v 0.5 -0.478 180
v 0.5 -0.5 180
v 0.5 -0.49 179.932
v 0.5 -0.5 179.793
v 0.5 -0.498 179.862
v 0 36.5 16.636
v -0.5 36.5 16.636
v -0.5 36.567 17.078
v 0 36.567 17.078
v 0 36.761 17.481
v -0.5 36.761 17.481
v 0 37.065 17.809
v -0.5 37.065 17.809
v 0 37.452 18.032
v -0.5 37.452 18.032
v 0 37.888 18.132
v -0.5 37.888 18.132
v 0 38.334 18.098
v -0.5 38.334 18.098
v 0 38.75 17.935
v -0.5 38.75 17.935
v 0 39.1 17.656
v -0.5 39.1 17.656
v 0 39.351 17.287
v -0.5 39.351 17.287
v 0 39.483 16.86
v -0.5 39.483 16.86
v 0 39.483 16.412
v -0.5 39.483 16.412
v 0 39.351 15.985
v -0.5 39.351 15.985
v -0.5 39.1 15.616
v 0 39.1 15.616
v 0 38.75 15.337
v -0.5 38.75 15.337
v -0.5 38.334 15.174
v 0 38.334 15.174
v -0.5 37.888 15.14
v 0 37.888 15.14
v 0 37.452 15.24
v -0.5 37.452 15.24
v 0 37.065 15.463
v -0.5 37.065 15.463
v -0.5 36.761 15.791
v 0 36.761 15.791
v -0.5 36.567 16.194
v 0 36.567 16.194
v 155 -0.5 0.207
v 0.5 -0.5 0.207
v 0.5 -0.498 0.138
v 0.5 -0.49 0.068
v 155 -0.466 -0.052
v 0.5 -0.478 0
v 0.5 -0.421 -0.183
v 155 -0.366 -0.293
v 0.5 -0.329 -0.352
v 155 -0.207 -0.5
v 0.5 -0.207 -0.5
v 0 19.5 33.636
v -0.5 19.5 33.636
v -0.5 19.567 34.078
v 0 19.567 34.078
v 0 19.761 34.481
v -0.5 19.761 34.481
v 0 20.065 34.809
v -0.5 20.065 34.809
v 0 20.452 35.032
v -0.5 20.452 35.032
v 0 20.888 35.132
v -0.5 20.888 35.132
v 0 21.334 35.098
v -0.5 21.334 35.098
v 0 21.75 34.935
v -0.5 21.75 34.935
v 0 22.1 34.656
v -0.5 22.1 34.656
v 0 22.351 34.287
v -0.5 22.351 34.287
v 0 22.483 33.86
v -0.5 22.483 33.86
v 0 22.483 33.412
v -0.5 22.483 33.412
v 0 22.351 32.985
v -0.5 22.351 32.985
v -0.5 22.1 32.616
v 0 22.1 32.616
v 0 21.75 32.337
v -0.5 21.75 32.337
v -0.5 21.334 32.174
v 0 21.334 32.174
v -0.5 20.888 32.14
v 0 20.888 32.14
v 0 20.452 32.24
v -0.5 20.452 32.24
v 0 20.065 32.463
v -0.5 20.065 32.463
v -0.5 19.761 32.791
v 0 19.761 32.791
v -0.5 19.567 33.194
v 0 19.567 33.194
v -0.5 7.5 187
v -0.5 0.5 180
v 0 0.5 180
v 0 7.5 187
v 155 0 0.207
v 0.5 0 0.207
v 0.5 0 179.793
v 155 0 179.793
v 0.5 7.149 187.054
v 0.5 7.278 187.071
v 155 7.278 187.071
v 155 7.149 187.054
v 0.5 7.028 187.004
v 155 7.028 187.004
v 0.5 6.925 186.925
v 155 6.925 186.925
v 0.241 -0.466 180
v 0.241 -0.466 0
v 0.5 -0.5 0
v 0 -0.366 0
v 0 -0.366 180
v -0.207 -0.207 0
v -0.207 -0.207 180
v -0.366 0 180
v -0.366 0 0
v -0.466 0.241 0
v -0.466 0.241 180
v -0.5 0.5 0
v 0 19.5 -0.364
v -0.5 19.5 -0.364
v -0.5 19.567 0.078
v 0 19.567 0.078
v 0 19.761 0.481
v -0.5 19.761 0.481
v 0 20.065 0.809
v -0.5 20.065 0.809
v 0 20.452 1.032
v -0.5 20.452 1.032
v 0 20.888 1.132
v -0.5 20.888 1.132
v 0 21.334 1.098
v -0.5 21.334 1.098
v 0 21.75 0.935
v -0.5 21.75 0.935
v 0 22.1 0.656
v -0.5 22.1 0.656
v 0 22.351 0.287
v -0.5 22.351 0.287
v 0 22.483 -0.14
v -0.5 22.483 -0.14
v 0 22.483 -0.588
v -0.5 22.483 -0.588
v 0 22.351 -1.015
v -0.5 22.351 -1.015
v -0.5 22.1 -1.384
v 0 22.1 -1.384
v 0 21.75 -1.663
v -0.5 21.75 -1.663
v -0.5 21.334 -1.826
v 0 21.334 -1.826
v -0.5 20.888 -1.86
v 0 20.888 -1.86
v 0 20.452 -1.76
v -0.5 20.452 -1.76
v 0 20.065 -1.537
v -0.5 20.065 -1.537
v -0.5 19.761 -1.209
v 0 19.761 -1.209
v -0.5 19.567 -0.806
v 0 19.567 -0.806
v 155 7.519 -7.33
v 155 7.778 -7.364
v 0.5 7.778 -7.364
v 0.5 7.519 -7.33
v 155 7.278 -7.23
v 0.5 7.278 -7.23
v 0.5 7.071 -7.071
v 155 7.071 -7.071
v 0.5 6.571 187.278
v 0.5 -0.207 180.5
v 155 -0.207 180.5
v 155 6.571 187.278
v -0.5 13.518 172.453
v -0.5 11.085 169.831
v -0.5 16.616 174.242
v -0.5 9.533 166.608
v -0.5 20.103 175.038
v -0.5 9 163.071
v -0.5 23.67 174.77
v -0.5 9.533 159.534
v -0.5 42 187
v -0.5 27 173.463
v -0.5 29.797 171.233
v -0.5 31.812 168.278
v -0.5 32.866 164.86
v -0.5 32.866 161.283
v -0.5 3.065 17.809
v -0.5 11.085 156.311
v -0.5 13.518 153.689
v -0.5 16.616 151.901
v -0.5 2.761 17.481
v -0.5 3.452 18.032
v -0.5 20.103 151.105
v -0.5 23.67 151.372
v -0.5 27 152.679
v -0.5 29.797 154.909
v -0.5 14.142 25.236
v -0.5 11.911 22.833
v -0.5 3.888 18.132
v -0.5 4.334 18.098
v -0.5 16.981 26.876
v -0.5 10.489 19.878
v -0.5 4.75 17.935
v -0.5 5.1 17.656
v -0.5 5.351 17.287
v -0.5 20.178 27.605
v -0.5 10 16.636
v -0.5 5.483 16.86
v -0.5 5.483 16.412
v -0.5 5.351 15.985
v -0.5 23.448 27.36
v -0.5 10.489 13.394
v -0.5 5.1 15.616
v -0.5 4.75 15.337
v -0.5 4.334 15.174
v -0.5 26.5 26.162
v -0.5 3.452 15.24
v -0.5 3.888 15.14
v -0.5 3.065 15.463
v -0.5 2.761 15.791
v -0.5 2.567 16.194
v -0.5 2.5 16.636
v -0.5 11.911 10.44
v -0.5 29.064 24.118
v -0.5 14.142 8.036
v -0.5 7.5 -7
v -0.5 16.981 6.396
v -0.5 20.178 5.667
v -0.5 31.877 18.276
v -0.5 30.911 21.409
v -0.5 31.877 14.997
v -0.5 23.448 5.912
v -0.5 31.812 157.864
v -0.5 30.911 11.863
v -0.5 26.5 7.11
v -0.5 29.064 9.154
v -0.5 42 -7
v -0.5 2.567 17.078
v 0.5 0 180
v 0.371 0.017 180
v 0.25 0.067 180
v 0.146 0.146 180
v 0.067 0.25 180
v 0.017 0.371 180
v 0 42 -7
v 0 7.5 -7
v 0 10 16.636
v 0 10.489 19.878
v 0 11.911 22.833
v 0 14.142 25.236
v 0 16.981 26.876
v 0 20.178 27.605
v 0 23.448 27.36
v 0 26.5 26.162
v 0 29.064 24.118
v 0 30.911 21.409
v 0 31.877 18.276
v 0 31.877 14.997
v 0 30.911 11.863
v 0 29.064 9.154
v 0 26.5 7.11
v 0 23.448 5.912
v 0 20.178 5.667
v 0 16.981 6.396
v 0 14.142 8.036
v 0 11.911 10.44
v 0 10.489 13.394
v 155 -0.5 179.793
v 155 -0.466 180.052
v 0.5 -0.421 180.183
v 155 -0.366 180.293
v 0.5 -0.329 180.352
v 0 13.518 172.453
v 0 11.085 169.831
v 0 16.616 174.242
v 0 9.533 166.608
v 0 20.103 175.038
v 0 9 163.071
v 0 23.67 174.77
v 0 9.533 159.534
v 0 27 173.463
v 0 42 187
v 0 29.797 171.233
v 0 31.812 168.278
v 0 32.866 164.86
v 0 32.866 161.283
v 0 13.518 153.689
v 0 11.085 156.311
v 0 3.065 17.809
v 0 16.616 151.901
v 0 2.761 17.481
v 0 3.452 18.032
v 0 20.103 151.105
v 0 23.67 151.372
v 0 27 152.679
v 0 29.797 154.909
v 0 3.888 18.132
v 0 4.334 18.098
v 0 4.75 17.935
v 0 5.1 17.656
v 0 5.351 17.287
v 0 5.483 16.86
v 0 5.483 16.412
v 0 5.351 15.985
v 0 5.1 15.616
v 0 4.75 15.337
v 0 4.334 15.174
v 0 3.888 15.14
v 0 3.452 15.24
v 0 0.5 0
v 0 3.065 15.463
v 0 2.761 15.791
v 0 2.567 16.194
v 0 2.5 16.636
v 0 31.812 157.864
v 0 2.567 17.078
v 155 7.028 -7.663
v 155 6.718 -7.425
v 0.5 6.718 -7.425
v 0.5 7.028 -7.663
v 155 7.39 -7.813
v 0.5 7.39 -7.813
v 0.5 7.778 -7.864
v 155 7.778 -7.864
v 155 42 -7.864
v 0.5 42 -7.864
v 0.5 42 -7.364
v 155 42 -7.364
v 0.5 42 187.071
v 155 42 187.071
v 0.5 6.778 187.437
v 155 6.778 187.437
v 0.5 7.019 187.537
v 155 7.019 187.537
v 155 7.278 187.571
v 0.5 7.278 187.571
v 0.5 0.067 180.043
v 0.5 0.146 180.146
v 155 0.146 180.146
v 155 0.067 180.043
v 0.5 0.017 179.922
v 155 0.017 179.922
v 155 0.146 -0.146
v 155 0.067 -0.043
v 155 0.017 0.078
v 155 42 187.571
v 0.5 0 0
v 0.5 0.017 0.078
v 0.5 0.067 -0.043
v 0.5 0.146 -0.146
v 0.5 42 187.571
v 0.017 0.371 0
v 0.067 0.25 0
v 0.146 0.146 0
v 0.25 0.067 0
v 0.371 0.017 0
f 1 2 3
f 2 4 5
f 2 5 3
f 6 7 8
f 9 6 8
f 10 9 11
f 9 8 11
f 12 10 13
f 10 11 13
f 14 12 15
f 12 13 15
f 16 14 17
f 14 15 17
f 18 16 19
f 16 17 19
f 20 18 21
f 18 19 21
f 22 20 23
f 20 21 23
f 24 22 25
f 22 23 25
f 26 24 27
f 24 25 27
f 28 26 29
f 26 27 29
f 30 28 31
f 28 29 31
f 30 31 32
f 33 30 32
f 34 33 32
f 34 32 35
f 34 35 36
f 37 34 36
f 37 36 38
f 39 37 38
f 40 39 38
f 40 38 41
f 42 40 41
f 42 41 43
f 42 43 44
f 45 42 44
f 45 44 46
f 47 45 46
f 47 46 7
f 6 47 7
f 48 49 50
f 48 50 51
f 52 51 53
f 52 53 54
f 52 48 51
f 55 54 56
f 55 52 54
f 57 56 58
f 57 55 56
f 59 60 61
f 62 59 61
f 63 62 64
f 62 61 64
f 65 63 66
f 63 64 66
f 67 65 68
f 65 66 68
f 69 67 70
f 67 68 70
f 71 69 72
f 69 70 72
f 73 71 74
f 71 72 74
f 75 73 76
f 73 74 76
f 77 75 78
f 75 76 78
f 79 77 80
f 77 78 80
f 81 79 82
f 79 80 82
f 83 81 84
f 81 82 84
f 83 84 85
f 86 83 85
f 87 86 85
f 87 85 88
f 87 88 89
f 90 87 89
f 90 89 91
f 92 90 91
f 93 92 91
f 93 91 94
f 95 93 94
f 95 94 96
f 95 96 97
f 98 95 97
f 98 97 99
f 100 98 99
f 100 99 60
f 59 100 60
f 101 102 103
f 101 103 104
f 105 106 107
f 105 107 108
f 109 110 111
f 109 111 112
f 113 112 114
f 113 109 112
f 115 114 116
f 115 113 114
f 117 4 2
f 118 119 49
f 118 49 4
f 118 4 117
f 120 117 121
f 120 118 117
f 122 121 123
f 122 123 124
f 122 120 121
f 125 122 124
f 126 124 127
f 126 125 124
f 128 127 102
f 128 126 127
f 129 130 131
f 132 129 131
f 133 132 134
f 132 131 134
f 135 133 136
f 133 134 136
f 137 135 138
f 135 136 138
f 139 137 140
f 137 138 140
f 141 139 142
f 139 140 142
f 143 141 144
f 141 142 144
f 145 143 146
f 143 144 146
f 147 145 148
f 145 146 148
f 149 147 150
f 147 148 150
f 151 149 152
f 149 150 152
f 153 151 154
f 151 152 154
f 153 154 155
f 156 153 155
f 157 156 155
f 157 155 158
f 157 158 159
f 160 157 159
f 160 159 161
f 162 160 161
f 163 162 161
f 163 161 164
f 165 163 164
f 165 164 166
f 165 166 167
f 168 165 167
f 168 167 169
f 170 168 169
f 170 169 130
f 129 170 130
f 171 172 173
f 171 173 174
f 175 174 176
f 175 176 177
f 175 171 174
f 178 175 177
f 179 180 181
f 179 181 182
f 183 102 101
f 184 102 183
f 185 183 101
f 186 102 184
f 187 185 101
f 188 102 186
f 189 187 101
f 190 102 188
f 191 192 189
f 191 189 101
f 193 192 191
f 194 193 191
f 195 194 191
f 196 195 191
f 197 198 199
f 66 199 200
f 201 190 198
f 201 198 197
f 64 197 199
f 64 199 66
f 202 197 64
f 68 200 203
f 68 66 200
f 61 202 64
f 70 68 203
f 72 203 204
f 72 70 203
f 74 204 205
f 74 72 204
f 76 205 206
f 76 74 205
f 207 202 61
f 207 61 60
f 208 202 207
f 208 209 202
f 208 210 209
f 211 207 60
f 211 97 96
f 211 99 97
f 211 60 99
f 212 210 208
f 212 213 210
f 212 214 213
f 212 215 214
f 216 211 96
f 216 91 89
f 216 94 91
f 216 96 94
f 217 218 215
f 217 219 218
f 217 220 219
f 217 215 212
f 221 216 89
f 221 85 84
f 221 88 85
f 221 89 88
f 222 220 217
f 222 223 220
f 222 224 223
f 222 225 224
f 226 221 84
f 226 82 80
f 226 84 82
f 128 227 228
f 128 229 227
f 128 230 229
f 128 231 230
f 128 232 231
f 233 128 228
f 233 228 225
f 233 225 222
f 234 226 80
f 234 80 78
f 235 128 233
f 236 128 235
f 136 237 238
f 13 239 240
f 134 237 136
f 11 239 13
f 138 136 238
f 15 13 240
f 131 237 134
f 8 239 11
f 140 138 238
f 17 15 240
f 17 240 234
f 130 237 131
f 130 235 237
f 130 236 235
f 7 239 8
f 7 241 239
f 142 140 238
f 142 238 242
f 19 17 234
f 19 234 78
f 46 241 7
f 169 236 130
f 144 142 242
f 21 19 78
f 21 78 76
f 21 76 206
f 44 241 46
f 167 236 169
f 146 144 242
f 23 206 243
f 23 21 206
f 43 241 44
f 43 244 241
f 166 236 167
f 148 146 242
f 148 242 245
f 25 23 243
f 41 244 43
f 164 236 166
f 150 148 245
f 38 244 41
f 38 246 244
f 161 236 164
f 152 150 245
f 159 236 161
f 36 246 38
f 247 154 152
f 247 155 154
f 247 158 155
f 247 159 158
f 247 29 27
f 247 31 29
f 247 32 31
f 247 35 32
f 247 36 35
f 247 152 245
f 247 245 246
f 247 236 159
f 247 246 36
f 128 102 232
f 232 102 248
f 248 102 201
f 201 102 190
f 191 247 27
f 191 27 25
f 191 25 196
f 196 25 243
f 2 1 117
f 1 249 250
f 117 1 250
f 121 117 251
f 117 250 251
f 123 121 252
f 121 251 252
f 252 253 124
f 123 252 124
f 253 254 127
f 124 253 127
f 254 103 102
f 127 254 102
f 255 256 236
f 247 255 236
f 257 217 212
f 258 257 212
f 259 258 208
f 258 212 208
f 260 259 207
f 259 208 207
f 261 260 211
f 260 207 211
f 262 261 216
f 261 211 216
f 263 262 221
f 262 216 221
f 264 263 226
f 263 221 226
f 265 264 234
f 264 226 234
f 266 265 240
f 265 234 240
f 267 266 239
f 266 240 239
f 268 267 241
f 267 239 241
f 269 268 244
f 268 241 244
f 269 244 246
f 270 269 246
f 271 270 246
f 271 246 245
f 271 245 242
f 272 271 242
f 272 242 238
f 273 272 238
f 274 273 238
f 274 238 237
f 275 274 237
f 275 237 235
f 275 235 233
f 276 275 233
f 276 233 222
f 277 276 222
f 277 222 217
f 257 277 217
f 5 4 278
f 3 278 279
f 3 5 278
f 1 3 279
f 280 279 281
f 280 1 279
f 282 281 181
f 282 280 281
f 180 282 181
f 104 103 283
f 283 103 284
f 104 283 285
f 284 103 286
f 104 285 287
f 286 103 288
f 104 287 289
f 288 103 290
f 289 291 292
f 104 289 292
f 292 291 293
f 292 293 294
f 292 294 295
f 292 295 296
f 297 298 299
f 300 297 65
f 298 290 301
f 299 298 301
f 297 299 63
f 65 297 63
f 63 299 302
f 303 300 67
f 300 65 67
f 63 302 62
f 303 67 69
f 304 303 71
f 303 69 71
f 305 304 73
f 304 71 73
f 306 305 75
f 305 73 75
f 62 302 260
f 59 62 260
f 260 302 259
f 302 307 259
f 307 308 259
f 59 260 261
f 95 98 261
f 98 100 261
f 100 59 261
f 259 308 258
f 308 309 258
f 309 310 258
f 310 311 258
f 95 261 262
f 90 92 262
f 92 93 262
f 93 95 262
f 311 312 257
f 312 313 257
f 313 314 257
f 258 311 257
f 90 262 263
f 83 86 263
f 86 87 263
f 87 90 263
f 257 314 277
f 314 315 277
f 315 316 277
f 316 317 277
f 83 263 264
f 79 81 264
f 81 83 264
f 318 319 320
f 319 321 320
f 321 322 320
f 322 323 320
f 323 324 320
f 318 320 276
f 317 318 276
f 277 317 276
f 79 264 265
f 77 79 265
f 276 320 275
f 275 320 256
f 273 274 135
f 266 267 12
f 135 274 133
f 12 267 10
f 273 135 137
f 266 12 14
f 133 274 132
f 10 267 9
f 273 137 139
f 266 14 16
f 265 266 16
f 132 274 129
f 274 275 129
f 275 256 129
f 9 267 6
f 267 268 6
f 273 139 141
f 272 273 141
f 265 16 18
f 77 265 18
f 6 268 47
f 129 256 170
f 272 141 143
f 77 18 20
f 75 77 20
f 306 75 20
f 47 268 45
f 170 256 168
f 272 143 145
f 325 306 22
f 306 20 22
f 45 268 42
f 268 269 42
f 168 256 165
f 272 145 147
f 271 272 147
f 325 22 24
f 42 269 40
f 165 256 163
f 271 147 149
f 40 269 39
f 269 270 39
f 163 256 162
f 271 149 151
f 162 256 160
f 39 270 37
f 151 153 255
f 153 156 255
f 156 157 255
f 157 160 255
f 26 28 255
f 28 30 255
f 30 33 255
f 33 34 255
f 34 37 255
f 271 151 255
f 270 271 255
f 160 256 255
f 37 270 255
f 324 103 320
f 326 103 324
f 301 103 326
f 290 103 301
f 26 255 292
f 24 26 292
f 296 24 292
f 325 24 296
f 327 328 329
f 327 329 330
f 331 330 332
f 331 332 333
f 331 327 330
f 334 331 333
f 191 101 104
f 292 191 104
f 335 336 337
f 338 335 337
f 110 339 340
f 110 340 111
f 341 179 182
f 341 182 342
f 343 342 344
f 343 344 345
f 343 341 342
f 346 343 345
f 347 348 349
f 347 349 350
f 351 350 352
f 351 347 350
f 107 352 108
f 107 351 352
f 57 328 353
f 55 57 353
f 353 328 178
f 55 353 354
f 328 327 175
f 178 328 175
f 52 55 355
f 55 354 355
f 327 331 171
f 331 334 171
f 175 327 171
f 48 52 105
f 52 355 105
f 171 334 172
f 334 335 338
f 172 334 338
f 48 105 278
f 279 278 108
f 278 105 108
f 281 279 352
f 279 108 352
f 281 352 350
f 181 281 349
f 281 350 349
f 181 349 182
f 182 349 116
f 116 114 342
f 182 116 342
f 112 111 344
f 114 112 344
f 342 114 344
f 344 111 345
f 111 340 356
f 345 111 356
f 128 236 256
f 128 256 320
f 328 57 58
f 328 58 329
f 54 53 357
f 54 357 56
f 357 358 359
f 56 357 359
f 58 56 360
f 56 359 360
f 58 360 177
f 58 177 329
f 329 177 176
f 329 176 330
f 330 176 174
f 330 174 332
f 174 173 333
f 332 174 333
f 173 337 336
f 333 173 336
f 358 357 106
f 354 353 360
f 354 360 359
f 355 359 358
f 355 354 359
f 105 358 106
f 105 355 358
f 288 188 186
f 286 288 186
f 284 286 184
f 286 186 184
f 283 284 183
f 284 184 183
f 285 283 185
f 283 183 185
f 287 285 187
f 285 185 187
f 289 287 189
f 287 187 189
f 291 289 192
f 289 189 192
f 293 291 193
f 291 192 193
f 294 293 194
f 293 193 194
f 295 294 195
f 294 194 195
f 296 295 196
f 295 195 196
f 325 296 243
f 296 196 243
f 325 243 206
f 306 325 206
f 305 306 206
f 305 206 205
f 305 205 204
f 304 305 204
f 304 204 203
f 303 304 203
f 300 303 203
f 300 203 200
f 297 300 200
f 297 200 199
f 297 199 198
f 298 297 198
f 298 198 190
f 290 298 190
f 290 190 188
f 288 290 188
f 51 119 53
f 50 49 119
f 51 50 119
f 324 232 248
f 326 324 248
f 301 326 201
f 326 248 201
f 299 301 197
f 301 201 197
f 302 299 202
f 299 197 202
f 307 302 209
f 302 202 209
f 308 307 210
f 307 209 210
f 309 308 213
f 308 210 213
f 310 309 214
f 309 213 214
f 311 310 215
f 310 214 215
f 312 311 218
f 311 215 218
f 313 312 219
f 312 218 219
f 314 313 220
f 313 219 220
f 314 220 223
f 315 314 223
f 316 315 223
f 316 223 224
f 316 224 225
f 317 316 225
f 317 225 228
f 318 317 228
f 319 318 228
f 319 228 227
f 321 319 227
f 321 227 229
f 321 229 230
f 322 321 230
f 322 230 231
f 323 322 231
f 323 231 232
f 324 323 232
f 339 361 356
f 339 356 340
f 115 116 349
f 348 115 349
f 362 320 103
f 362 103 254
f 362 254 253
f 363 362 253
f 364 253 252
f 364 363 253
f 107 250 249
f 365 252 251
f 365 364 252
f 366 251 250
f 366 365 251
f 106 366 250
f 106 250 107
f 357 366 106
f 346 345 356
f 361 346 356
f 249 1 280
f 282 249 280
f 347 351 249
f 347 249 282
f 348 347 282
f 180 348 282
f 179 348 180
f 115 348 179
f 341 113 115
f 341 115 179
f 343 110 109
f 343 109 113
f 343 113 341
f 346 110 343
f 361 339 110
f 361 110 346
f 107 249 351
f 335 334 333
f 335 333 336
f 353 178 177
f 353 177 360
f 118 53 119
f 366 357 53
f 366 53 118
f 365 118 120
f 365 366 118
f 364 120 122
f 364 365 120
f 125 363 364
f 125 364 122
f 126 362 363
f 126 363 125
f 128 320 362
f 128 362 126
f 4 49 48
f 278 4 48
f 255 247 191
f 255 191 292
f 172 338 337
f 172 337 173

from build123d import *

# Parameters (mm, degrees)
SKETCH1_W                    = 155
SKETCH1_H                    = 180
BASE_FLANGE1_DEPTH           = 0.5
EDGE_FLANGE1_STRIP_W         = 3
EDGE_FLANGE1_STRIP_H         = 0.5
EDGE_FLANGE1_STRIP_CUT_DEPTH = 180
EDGE_FLANGE1_DEPTH           = 180
EDGE_FLANGE3_STRIP_CUT_DEPTH = 154.5
EDGE_FLANGE3_DEPTH           = 154.5
EDGE_FLANGE4_DEPTH           = 154.5
SKETCH25_W                   = 0.5
SKETCH25_H                   = 41.5
BOSS_EXTRUDE1_DEPTH          = 7
CUT_EXTRUDE2_DEPTH           = 0.5
EDGE_FLANGE5_STRIP_CUT_DEPTH = 154.5
EDGE_FLANGE5_DEPTH           = 154.5
EDGE_FLANGE6_STRIP_CUT_DEPTH = 154.5
EDGE_FLANGE6_DEPTH           = 154.5
SKETCH41_W                   = 0.5
SKETCH41_H                   = 41.5
BOSS_EXTRUDE2_DEPTH          = 7
CUT_EXTRUDE3_DEPTH           = 0.5
SKETCH45_R                   = 11
SKETCH45_R_2                 = 12
CUT_EXTRUDE6_DEPTH           = 2
SKETCH51_R                   = 1.5
CUT_EXTRUDE7_DEPTH           = 2


# Sheet-metal steps are written as plain solids
with BuildPart() as part:
    # Sketch1 → Base-Flange1 (new body)
    with BuildSketch(Plane(origin=(0, 0, 0), x_dir=(1, 0, 0), z_dir=(0, 1, 0))):
        with Locations((77.5, -90)):
            Rectangle(SKETCH1_W, SKETCH1_H)
    extrude(amount=-BASE_FLANGE1_DEPTH)

    # Edge-Flange1 strip (across the edge) → Edge-Flange1 strip cut (cut)
    with BuildSketch(Plane.XY):
        with Locations((-1, -0.25)):
            Rectangle(EDGE_FLANGE1_STRIP_W, EDGE_FLANGE1_STRIP_H)
    extrude(amount=EDGE_FLANGE1_STRIP_CUT_DEPTH, mode=Mode.SUBTRACT)

    # Edge-Flange1 section (across the edge) → Edge-Flange1 (add)
    with BuildSketch(Plane.XY):
        with BuildLine():
            Line((-0.5, 0.5), (-0.5, 42))
            Line((-0.5, 42), (0, 42))
            Line((0, 42), (0, 0.5))
            ThreePointArc((0, 0.5), (0.146446609, 0.146446609), (0.5, 0))
            Line((0.5, 0), (0.5, -0.5))
            ThreePointArc((0.5, -0.5), (-0.207106781, -0.207106781), (-0.5, 0.5))
        make_face()
    extrude(amount=EDGE_FLANGE1_DEPTH)

    # Edge-Flange3 strip (across the edge) → Edge-Flange3 strip cut (cut)
    with BuildSketch(Plane(origin=(155, 0, 0), x_dir=(0, 0.7071067811865512, 0.7071067811865438), z_dir=(-1, 0, 0))):
        Polygon((-2.328427125, 1.621320344), (-0.207106781, -0.5), (0.146446609, -0.146446609), (-1.974873734, 1.974873734), align=None)
    extrude(amount=EDGE_FLANGE3_STRIP_CUT_DEPTH, mode=Mode.SUBTRACT)

    # Edge-Flange3 section (across the edge) → Edge-Flange3 (add)
    with BuildSketch(Plane(origin=(155, 0, 0), x_dir=(0, 0.7071067811865512, 0.7071067811865438), z_dir=(-1, 0, 0))):
        with BuildLine():
            Line((-0.5, 0.207106781), (-0.5, 10))
            Line((-0.5, 10), (0, 10))
            Line((0, 10), (0, 0.207106781))
            ThreePointArc((0, 0.207106781), (0.038060234, 0.015765065), (0.146446609, -0.146446609))
            Line((0.146446609, -0.146446609), (-0.207106781, -0.5))
            ThreePointArc((-0.207106781, -0.5), (-0.423879533, -0.175576651), (-0.5, 0.207106781))
        make_face()
    extrude(amount=EDGE_FLANGE3_DEPTH)

    # Edge-Flange4 section (across the edge) → Edge-Flange4 (add)
    with BuildSketch(Plane(origin=(155, 7.363961031, -7.363961031), x_dir=(0, 0, 1), z_dir=(-1, 0, 0))):
        with BuildLine():
            Line((-0.5, 0.414213562), (-0.5, 34.636038969))
            Line((-0.5, 34.636038969), (0, 34.636038969))
            Line((0, 34.636038969), (0, 0.414213562))
            ThreePointArc((0, 0.414213562), (0.076120467, 0.03153013), (0.292893219, -0.292893219))
            Line((0.292893219, -0.292893219), (-0.060660172, -0.646446609))
            ThreePointArc((-0.060660172, -0.646446609), (-0.385819299, -0.159811586), (-0.5, 0.414213562))
        make_face()
    extrude(amount=EDGE_FLANGE4_DEPTH)

    # Sketch25 → Boss-Extrude1 (add)
    with BuildSketch(Plane(origin=(0, 0, 0), x_dir=(-1, 0, 0), z_dir=(0, 0, -1))):
        with Locations((0.25, 21.25)):
            Rectangle(SKETCH25_W, SKETCH25_H)
    extrude(amount=BOSS_EXTRUDE1_DEPTH)

    # Sketch28 → Cut-Extrude2 (cut)
    with BuildSketch(Plane.ZY.offset(0.5)):
        Polygon((-7.360561455, 7.860561455), (0, 0.5), (-7.360561455, 0.5), align=None)
    extrude(amount=-CUT_EXTRUDE2_DEPTH, mode=Mode.SUBTRACT)

    # Edge-Flange5 strip (across the edge) → Edge-Flange5 strip cut (cut)
    with BuildSketch(Plane(origin=(0.5, 0, 180), x_dir=(0, 0.7071067811865512, -0.7071067811865438), z_dir=(1, 0, 0))):
        Polygon((-2.328427125, 1.621320344), (-0.207106781, -0.5), (0.146446609, -0.146446609), (-1.974873734, 1.974873734), align=None)
    extrude(amount=EDGE_FLANGE5_STRIP_CUT_DEPTH, mode=Mode.SUBTRACT)

    # Edge-Flange5 section (across the edge) → Edge-Flange5 (add)
    with BuildSketch(Plane(origin=(0.5, 0, 180), x_dir=(0, 0.7071067811865512, -0.7071067811865438), z_dir=(1, 0, 0))):
        with BuildLine():
            Line((-0.5, 0.207106781), (-0.5, 10))
            Line((-0.5, 10), (0, 10))
            Line((0, 10), (0, 0.207106781))
            ThreePointArc((0, 0.207106781), (0.038060234, 0.015765065), (0.146446609, -0.146446609))
            Line((0.146446609, -0.146446609), (-0.207106781, -0.5))
            ThreePointArc((-0.207106781, -0.5), (-0.423879533, -0.175576651), (-0.5, 0.207106781))
        make_face()
    extrude(amount=EDGE_FLANGE5_DEPTH)

    # Edge-Flange6 strip (across the edge) → Edge-Flange6 strip cut (cut)
    with BuildSketch(Plane(origin=(0.5, 7.071067812, 187.071067812), x_dir=(0, 0, -1), z_dir=(1, 0, 0))):
        Polygon((-2.328427125, 1.621320344), (-0.207106781, -0.5), (0.146446609, -0.146446609), (-1.974873734, 1.974873734), align=None)
    extrude(amount=EDGE_FLANGE6_STRIP_CUT_DEPTH, mode=Mode.SUBTRACT)

    # Edge-Flange6 section (across the edge) → Edge-Flange6 (add)
    with BuildSketch(Plane(origin=(0.5, 7.071067812, 187.071067812), x_dir=(0, 0, -1), z_dir=(1, 0, 0))):
        with BuildLine():
            Line((-0.5, 0.207106781), (-0.5, 34.928932188))
            Line((-0.5, 34.928932188), (0, 34.928932188))
            Line((0, 34.928932188), (0, 0.207106781))
            ThreePointArc((0, 0.207106781), (0.038060234, 0.015765065), (0.146446609, -0.146446609))
            Line((0.146446609, -0.146446609), (-0.207106781, -0.5))
            ThreePointArc((-0.207106781, -0.5), (-0.423879533, -0.175576651), (-0.5, 0.207106781))
        make_face()
    extrude(amount=EDGE_FLANGE6_DEPTH)

    # Sketch41 → Boss-Extrude2 (add)
    with BuildSketch(Plane.XY.offset(180)):
        with Locations((-0.25, 21.25)):
            Rectangle(SKETCH41_W, SKETCH41_H)
    extrude(amount=BOSS_EXTRUDE2_DEPTH)

    # Sketch44 → Cut-Extrude3 (cut)
    with BuildSketch(Plane.ZY.offset(0.5)):
        Polygon((180, 0.5), (187, 7.5), (187, 0.5), align=None)
    extrude(amount=-CUT_EXTRUDE3_DEPTH, mode=Mode.SUBTRACT)

    # Sketch45 → Cut-Extrude6 (cut)
    with BuildSketch(Plane.ZY.offset(0.5)):
        with Locations(Location((16.636038969, 21, 0), (0, 0, 270))):
            Circle(SKETCH45_R)
        with Locations(Location((163.071067812, 21, 0), (0, 0, 270))):
            Circle(SKETCH45_R_2)
    extrude(amount=-CUT_EXTRUDE6_DEPTH, mode=Mode.SUBTRACT)

    # Sketch51 → Cut-Extrude7 (cut)
    with BuildSketch(Plane.ZY.offset(0.5)):
        with Locations(Location((16.636038969, 38, 0), (0, 0, 270))):
            Circle(SKETCH51_R)
        with Locations(Location((33.636038969, 21, 0), (0, 0, 270))):
            Circle(SKETCH51_R)
        with Locations(Location((16.636038969, 4, 0), (0, 0, 270))):
            Circle(SKETCH51_R)
        with Locations(Location((-0.363961031, 21, 0), (0, 0, 270))):
            Circle(SKETCH51_R)
    extrude(amount=-CUT_EXTRUDE7_DEPTH, mode=Mode.SUBTRACT)


solid = part.part
